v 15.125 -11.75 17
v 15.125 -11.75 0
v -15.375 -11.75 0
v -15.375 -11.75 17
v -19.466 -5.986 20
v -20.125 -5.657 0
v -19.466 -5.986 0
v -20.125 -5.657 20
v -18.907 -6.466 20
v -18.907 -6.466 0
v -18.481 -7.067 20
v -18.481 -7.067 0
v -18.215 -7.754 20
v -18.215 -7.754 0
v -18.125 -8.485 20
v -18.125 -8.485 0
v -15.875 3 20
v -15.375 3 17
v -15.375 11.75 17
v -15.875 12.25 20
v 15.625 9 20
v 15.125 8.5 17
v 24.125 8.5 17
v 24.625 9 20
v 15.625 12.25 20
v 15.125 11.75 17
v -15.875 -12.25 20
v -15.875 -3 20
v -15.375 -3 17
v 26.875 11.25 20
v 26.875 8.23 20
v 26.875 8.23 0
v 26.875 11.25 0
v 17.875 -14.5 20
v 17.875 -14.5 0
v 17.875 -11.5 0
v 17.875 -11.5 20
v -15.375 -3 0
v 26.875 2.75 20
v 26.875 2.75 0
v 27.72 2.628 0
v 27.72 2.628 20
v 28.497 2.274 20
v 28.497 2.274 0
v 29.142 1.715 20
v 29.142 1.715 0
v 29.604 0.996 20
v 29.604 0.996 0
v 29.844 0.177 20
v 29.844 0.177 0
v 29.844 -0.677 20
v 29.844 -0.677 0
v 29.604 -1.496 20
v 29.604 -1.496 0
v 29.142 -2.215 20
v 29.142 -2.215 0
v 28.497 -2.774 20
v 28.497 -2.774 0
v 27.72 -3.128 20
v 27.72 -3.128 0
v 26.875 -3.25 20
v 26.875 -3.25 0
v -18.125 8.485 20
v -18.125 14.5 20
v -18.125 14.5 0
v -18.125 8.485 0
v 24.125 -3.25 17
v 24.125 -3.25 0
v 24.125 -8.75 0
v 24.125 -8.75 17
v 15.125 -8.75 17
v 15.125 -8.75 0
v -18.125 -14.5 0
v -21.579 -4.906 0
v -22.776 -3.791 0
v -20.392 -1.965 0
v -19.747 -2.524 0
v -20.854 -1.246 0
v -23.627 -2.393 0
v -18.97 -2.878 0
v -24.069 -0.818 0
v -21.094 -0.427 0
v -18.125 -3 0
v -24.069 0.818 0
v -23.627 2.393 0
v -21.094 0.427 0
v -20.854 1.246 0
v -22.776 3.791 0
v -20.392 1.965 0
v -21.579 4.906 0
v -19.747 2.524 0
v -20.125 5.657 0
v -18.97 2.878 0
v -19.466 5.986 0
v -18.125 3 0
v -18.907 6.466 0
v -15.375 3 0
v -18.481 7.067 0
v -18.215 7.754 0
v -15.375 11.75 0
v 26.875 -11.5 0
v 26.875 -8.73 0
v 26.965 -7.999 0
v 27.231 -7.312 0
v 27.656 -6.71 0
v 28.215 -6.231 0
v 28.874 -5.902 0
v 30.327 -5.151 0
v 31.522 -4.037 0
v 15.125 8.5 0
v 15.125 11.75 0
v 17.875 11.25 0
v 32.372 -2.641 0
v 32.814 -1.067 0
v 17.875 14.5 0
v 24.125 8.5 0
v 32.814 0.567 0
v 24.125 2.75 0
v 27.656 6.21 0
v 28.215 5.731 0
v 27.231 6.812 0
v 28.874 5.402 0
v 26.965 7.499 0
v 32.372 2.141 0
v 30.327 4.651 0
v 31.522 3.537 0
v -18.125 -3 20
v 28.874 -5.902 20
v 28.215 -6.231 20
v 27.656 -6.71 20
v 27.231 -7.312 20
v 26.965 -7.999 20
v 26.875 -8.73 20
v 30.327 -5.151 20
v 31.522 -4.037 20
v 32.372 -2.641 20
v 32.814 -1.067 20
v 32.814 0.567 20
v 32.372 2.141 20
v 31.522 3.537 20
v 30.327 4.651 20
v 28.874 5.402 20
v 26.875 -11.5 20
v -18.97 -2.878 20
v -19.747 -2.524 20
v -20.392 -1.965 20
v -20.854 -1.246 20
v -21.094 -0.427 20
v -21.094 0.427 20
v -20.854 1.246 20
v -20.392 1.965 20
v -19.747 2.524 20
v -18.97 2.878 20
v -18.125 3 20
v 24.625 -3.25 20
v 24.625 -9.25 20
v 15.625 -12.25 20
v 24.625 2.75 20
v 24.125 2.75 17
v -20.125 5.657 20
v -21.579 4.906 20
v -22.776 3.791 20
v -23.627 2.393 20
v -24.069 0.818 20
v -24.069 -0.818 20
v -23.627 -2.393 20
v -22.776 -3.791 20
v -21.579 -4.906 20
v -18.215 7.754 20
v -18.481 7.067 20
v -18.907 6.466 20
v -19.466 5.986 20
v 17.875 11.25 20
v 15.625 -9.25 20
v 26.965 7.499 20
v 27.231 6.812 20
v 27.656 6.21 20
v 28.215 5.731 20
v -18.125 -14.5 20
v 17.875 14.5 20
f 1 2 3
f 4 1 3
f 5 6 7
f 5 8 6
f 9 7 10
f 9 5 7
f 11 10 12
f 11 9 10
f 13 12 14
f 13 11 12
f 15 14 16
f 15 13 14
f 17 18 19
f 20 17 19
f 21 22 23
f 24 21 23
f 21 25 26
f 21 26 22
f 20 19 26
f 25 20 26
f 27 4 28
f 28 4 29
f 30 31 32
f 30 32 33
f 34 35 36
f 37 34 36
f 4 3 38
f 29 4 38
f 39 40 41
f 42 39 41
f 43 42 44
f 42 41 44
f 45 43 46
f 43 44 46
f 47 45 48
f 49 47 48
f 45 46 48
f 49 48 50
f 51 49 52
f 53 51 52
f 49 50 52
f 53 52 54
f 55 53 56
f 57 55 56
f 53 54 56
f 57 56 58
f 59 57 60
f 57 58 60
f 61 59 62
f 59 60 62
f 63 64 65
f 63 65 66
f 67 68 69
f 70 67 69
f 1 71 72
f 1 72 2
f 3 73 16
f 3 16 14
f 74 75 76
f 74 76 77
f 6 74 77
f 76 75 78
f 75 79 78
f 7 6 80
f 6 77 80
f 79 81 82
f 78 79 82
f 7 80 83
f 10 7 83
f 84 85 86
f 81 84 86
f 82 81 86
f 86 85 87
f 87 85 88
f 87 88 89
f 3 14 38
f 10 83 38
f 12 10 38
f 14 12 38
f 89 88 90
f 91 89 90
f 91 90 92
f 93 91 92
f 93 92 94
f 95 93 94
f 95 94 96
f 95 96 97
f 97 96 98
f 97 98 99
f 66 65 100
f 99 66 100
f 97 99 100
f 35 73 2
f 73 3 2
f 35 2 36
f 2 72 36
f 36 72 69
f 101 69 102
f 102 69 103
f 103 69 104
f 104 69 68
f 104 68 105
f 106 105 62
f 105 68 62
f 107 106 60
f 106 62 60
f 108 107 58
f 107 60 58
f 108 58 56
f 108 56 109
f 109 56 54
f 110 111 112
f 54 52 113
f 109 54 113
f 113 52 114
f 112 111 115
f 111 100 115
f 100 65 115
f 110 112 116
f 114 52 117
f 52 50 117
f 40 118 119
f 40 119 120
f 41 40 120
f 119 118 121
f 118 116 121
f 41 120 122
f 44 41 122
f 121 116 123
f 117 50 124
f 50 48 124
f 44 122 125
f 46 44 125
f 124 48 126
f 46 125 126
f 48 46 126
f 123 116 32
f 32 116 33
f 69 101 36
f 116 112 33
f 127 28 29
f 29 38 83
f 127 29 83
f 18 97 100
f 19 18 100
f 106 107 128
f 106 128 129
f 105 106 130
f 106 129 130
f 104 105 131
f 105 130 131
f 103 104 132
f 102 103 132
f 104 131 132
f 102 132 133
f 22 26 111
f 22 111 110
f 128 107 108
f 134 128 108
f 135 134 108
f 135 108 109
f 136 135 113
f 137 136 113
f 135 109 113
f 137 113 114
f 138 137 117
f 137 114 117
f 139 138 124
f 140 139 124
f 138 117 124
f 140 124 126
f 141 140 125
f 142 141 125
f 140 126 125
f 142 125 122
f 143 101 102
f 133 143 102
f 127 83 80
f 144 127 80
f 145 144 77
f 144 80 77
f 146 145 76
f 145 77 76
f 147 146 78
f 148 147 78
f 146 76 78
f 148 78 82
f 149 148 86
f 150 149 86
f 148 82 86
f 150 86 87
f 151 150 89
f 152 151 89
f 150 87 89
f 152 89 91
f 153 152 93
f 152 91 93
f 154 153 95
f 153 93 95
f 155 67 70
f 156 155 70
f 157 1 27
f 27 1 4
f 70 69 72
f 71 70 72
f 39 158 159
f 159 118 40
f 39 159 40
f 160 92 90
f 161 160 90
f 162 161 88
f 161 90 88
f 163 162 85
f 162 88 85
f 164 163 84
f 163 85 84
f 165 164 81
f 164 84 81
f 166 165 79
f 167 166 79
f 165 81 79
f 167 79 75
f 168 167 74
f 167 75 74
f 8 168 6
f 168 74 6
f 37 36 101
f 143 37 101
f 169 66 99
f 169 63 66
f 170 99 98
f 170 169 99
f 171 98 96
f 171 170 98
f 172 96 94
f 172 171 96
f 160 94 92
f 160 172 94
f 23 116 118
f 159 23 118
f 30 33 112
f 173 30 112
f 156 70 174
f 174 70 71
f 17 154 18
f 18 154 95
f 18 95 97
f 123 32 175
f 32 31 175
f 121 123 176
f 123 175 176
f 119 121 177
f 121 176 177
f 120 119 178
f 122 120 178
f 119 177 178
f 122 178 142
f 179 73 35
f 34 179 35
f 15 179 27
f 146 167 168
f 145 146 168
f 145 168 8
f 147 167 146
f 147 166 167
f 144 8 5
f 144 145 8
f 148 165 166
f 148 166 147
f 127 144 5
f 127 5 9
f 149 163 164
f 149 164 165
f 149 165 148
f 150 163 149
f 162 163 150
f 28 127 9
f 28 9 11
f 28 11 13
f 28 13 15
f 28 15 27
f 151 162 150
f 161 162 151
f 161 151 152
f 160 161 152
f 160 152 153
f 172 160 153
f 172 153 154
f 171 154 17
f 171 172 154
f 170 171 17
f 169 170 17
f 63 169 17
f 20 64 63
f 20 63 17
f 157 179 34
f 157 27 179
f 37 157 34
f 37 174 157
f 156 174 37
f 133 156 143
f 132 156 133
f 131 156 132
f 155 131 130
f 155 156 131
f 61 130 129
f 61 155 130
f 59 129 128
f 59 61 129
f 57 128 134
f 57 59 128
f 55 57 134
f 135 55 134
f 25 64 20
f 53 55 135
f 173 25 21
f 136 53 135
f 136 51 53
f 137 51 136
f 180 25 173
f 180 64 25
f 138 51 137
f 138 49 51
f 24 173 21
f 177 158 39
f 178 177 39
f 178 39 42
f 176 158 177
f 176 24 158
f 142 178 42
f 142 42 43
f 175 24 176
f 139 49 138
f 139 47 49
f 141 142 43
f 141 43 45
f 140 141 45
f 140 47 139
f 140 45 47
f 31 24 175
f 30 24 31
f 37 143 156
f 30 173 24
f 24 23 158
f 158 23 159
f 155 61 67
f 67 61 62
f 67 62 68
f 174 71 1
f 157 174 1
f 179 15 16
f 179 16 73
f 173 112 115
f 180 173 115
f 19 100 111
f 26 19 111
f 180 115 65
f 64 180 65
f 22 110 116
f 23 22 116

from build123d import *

# Parameters (mm, degrees)
F1_DEPTH = 20
F2_R     = 3
F3_SIZE2 = 3
F3_SIZE  = 0.5


with BuildPart() as f1:
    # F0 (on Top) → F1 (new body)
    with BuildSketch(Plane.XY):
        with BuildLine():
            Line((17.875, 14.5), (-18.125, 14.5))
            Line((-18.125, 14.5), (-18.125, 6))
            ThreePointArc((-18.125, 6), (-24.125, 0), (-18.125, -6))
            Line((-18.125, -6), (-18.125, -14.5))
            Line((-18.125, -14.5), (17.875, -14.5))
            Line((17.875, -14.5), (17.875, -11.5))
            Line((17.875, -11.5), (26.875, -11.5))
            Line((26.875, -11.5), (26.875, -6.244789))
            ThreePointArc((26.875, -6.244789), (32.869789, -0.25), (26.875, 5.744789))
            Line((26.875, 5.744789), (26.875, 11.25))
            Line((26.875, 11.25), (17.875, 11.25))
            Line((17.875, 11.25), (17.875, 14.5))
        make_face()
        with BuildLine():
            Line((-15.375, 3), (-15.375, 11.75))
            Line((-15.375, 11.75), (15.125, 11.75))
            Line((15.125, 11.75), (15.125, 8.5))
            Line((15.125, 8.5), (24.125, 8.5))
            Line((24.125, 8.5), (24.125, 2.75))
            Line((24.125, 2.75), (26.875, 2.75))
            ThreePointArc((26.875, 2.75), (29.875, -0.25), (26.875, -3.25))
            Line((26.875, -3.25), (24.125, -3.25))
            Line((24.125, -3.25), (24.125, -8.75))
            Line((24.125, -8.75), (15.125, -8.75))
            Line((15.125, -8.75), (15.125, -11.75))
            Line((15.125, -11.75), (-15.375, -11.75))
            Line((-15.375, -11.75), (-15.375, -3))
            Line((-15.375, -3), (-18.125, -3))
            ThreePointArc((-18.125, -3), (-21.125, 0), (-18.125, 3))
            Line((-18.125, 3), (-15.375, 3))
        make_face(mode=Mode.SUBTRACT)
    extrude(amount=F1_DEPTH)

    # F2
    f2_edges = [f1.edges().sort_by_distance(p)[0] for p in [
        (26.875, -6.244789, 10),
        (26.875, 5.744789, 10),
        (-18.125, 6, 10),
        (-18.125, -6, 10),
    ]]
    fillet(f2_edges, radius=F2_R)

    # F3
    f3_edges = [f1.edges().sort_by_distance(p)[0] for p in [
        (-15.375, 7.375, 20),
        (-0.125, 11.75, 20),
        (-15.375, -7.375, 20),
        (-0.125, -11.75, 20),
        (15.125, -10.25, 20),
        (15.125, 10.125, 20),
        (19.625, 8.5, 20),
        (24.125, 5.625, 20),
        (24.125, -6, 20),
        (19.625, -8.75, 20),
    ]]
    chamfer(f3_edges, length=F3_SIZE, length2=F3_SIZE2)


solid = f1.part
